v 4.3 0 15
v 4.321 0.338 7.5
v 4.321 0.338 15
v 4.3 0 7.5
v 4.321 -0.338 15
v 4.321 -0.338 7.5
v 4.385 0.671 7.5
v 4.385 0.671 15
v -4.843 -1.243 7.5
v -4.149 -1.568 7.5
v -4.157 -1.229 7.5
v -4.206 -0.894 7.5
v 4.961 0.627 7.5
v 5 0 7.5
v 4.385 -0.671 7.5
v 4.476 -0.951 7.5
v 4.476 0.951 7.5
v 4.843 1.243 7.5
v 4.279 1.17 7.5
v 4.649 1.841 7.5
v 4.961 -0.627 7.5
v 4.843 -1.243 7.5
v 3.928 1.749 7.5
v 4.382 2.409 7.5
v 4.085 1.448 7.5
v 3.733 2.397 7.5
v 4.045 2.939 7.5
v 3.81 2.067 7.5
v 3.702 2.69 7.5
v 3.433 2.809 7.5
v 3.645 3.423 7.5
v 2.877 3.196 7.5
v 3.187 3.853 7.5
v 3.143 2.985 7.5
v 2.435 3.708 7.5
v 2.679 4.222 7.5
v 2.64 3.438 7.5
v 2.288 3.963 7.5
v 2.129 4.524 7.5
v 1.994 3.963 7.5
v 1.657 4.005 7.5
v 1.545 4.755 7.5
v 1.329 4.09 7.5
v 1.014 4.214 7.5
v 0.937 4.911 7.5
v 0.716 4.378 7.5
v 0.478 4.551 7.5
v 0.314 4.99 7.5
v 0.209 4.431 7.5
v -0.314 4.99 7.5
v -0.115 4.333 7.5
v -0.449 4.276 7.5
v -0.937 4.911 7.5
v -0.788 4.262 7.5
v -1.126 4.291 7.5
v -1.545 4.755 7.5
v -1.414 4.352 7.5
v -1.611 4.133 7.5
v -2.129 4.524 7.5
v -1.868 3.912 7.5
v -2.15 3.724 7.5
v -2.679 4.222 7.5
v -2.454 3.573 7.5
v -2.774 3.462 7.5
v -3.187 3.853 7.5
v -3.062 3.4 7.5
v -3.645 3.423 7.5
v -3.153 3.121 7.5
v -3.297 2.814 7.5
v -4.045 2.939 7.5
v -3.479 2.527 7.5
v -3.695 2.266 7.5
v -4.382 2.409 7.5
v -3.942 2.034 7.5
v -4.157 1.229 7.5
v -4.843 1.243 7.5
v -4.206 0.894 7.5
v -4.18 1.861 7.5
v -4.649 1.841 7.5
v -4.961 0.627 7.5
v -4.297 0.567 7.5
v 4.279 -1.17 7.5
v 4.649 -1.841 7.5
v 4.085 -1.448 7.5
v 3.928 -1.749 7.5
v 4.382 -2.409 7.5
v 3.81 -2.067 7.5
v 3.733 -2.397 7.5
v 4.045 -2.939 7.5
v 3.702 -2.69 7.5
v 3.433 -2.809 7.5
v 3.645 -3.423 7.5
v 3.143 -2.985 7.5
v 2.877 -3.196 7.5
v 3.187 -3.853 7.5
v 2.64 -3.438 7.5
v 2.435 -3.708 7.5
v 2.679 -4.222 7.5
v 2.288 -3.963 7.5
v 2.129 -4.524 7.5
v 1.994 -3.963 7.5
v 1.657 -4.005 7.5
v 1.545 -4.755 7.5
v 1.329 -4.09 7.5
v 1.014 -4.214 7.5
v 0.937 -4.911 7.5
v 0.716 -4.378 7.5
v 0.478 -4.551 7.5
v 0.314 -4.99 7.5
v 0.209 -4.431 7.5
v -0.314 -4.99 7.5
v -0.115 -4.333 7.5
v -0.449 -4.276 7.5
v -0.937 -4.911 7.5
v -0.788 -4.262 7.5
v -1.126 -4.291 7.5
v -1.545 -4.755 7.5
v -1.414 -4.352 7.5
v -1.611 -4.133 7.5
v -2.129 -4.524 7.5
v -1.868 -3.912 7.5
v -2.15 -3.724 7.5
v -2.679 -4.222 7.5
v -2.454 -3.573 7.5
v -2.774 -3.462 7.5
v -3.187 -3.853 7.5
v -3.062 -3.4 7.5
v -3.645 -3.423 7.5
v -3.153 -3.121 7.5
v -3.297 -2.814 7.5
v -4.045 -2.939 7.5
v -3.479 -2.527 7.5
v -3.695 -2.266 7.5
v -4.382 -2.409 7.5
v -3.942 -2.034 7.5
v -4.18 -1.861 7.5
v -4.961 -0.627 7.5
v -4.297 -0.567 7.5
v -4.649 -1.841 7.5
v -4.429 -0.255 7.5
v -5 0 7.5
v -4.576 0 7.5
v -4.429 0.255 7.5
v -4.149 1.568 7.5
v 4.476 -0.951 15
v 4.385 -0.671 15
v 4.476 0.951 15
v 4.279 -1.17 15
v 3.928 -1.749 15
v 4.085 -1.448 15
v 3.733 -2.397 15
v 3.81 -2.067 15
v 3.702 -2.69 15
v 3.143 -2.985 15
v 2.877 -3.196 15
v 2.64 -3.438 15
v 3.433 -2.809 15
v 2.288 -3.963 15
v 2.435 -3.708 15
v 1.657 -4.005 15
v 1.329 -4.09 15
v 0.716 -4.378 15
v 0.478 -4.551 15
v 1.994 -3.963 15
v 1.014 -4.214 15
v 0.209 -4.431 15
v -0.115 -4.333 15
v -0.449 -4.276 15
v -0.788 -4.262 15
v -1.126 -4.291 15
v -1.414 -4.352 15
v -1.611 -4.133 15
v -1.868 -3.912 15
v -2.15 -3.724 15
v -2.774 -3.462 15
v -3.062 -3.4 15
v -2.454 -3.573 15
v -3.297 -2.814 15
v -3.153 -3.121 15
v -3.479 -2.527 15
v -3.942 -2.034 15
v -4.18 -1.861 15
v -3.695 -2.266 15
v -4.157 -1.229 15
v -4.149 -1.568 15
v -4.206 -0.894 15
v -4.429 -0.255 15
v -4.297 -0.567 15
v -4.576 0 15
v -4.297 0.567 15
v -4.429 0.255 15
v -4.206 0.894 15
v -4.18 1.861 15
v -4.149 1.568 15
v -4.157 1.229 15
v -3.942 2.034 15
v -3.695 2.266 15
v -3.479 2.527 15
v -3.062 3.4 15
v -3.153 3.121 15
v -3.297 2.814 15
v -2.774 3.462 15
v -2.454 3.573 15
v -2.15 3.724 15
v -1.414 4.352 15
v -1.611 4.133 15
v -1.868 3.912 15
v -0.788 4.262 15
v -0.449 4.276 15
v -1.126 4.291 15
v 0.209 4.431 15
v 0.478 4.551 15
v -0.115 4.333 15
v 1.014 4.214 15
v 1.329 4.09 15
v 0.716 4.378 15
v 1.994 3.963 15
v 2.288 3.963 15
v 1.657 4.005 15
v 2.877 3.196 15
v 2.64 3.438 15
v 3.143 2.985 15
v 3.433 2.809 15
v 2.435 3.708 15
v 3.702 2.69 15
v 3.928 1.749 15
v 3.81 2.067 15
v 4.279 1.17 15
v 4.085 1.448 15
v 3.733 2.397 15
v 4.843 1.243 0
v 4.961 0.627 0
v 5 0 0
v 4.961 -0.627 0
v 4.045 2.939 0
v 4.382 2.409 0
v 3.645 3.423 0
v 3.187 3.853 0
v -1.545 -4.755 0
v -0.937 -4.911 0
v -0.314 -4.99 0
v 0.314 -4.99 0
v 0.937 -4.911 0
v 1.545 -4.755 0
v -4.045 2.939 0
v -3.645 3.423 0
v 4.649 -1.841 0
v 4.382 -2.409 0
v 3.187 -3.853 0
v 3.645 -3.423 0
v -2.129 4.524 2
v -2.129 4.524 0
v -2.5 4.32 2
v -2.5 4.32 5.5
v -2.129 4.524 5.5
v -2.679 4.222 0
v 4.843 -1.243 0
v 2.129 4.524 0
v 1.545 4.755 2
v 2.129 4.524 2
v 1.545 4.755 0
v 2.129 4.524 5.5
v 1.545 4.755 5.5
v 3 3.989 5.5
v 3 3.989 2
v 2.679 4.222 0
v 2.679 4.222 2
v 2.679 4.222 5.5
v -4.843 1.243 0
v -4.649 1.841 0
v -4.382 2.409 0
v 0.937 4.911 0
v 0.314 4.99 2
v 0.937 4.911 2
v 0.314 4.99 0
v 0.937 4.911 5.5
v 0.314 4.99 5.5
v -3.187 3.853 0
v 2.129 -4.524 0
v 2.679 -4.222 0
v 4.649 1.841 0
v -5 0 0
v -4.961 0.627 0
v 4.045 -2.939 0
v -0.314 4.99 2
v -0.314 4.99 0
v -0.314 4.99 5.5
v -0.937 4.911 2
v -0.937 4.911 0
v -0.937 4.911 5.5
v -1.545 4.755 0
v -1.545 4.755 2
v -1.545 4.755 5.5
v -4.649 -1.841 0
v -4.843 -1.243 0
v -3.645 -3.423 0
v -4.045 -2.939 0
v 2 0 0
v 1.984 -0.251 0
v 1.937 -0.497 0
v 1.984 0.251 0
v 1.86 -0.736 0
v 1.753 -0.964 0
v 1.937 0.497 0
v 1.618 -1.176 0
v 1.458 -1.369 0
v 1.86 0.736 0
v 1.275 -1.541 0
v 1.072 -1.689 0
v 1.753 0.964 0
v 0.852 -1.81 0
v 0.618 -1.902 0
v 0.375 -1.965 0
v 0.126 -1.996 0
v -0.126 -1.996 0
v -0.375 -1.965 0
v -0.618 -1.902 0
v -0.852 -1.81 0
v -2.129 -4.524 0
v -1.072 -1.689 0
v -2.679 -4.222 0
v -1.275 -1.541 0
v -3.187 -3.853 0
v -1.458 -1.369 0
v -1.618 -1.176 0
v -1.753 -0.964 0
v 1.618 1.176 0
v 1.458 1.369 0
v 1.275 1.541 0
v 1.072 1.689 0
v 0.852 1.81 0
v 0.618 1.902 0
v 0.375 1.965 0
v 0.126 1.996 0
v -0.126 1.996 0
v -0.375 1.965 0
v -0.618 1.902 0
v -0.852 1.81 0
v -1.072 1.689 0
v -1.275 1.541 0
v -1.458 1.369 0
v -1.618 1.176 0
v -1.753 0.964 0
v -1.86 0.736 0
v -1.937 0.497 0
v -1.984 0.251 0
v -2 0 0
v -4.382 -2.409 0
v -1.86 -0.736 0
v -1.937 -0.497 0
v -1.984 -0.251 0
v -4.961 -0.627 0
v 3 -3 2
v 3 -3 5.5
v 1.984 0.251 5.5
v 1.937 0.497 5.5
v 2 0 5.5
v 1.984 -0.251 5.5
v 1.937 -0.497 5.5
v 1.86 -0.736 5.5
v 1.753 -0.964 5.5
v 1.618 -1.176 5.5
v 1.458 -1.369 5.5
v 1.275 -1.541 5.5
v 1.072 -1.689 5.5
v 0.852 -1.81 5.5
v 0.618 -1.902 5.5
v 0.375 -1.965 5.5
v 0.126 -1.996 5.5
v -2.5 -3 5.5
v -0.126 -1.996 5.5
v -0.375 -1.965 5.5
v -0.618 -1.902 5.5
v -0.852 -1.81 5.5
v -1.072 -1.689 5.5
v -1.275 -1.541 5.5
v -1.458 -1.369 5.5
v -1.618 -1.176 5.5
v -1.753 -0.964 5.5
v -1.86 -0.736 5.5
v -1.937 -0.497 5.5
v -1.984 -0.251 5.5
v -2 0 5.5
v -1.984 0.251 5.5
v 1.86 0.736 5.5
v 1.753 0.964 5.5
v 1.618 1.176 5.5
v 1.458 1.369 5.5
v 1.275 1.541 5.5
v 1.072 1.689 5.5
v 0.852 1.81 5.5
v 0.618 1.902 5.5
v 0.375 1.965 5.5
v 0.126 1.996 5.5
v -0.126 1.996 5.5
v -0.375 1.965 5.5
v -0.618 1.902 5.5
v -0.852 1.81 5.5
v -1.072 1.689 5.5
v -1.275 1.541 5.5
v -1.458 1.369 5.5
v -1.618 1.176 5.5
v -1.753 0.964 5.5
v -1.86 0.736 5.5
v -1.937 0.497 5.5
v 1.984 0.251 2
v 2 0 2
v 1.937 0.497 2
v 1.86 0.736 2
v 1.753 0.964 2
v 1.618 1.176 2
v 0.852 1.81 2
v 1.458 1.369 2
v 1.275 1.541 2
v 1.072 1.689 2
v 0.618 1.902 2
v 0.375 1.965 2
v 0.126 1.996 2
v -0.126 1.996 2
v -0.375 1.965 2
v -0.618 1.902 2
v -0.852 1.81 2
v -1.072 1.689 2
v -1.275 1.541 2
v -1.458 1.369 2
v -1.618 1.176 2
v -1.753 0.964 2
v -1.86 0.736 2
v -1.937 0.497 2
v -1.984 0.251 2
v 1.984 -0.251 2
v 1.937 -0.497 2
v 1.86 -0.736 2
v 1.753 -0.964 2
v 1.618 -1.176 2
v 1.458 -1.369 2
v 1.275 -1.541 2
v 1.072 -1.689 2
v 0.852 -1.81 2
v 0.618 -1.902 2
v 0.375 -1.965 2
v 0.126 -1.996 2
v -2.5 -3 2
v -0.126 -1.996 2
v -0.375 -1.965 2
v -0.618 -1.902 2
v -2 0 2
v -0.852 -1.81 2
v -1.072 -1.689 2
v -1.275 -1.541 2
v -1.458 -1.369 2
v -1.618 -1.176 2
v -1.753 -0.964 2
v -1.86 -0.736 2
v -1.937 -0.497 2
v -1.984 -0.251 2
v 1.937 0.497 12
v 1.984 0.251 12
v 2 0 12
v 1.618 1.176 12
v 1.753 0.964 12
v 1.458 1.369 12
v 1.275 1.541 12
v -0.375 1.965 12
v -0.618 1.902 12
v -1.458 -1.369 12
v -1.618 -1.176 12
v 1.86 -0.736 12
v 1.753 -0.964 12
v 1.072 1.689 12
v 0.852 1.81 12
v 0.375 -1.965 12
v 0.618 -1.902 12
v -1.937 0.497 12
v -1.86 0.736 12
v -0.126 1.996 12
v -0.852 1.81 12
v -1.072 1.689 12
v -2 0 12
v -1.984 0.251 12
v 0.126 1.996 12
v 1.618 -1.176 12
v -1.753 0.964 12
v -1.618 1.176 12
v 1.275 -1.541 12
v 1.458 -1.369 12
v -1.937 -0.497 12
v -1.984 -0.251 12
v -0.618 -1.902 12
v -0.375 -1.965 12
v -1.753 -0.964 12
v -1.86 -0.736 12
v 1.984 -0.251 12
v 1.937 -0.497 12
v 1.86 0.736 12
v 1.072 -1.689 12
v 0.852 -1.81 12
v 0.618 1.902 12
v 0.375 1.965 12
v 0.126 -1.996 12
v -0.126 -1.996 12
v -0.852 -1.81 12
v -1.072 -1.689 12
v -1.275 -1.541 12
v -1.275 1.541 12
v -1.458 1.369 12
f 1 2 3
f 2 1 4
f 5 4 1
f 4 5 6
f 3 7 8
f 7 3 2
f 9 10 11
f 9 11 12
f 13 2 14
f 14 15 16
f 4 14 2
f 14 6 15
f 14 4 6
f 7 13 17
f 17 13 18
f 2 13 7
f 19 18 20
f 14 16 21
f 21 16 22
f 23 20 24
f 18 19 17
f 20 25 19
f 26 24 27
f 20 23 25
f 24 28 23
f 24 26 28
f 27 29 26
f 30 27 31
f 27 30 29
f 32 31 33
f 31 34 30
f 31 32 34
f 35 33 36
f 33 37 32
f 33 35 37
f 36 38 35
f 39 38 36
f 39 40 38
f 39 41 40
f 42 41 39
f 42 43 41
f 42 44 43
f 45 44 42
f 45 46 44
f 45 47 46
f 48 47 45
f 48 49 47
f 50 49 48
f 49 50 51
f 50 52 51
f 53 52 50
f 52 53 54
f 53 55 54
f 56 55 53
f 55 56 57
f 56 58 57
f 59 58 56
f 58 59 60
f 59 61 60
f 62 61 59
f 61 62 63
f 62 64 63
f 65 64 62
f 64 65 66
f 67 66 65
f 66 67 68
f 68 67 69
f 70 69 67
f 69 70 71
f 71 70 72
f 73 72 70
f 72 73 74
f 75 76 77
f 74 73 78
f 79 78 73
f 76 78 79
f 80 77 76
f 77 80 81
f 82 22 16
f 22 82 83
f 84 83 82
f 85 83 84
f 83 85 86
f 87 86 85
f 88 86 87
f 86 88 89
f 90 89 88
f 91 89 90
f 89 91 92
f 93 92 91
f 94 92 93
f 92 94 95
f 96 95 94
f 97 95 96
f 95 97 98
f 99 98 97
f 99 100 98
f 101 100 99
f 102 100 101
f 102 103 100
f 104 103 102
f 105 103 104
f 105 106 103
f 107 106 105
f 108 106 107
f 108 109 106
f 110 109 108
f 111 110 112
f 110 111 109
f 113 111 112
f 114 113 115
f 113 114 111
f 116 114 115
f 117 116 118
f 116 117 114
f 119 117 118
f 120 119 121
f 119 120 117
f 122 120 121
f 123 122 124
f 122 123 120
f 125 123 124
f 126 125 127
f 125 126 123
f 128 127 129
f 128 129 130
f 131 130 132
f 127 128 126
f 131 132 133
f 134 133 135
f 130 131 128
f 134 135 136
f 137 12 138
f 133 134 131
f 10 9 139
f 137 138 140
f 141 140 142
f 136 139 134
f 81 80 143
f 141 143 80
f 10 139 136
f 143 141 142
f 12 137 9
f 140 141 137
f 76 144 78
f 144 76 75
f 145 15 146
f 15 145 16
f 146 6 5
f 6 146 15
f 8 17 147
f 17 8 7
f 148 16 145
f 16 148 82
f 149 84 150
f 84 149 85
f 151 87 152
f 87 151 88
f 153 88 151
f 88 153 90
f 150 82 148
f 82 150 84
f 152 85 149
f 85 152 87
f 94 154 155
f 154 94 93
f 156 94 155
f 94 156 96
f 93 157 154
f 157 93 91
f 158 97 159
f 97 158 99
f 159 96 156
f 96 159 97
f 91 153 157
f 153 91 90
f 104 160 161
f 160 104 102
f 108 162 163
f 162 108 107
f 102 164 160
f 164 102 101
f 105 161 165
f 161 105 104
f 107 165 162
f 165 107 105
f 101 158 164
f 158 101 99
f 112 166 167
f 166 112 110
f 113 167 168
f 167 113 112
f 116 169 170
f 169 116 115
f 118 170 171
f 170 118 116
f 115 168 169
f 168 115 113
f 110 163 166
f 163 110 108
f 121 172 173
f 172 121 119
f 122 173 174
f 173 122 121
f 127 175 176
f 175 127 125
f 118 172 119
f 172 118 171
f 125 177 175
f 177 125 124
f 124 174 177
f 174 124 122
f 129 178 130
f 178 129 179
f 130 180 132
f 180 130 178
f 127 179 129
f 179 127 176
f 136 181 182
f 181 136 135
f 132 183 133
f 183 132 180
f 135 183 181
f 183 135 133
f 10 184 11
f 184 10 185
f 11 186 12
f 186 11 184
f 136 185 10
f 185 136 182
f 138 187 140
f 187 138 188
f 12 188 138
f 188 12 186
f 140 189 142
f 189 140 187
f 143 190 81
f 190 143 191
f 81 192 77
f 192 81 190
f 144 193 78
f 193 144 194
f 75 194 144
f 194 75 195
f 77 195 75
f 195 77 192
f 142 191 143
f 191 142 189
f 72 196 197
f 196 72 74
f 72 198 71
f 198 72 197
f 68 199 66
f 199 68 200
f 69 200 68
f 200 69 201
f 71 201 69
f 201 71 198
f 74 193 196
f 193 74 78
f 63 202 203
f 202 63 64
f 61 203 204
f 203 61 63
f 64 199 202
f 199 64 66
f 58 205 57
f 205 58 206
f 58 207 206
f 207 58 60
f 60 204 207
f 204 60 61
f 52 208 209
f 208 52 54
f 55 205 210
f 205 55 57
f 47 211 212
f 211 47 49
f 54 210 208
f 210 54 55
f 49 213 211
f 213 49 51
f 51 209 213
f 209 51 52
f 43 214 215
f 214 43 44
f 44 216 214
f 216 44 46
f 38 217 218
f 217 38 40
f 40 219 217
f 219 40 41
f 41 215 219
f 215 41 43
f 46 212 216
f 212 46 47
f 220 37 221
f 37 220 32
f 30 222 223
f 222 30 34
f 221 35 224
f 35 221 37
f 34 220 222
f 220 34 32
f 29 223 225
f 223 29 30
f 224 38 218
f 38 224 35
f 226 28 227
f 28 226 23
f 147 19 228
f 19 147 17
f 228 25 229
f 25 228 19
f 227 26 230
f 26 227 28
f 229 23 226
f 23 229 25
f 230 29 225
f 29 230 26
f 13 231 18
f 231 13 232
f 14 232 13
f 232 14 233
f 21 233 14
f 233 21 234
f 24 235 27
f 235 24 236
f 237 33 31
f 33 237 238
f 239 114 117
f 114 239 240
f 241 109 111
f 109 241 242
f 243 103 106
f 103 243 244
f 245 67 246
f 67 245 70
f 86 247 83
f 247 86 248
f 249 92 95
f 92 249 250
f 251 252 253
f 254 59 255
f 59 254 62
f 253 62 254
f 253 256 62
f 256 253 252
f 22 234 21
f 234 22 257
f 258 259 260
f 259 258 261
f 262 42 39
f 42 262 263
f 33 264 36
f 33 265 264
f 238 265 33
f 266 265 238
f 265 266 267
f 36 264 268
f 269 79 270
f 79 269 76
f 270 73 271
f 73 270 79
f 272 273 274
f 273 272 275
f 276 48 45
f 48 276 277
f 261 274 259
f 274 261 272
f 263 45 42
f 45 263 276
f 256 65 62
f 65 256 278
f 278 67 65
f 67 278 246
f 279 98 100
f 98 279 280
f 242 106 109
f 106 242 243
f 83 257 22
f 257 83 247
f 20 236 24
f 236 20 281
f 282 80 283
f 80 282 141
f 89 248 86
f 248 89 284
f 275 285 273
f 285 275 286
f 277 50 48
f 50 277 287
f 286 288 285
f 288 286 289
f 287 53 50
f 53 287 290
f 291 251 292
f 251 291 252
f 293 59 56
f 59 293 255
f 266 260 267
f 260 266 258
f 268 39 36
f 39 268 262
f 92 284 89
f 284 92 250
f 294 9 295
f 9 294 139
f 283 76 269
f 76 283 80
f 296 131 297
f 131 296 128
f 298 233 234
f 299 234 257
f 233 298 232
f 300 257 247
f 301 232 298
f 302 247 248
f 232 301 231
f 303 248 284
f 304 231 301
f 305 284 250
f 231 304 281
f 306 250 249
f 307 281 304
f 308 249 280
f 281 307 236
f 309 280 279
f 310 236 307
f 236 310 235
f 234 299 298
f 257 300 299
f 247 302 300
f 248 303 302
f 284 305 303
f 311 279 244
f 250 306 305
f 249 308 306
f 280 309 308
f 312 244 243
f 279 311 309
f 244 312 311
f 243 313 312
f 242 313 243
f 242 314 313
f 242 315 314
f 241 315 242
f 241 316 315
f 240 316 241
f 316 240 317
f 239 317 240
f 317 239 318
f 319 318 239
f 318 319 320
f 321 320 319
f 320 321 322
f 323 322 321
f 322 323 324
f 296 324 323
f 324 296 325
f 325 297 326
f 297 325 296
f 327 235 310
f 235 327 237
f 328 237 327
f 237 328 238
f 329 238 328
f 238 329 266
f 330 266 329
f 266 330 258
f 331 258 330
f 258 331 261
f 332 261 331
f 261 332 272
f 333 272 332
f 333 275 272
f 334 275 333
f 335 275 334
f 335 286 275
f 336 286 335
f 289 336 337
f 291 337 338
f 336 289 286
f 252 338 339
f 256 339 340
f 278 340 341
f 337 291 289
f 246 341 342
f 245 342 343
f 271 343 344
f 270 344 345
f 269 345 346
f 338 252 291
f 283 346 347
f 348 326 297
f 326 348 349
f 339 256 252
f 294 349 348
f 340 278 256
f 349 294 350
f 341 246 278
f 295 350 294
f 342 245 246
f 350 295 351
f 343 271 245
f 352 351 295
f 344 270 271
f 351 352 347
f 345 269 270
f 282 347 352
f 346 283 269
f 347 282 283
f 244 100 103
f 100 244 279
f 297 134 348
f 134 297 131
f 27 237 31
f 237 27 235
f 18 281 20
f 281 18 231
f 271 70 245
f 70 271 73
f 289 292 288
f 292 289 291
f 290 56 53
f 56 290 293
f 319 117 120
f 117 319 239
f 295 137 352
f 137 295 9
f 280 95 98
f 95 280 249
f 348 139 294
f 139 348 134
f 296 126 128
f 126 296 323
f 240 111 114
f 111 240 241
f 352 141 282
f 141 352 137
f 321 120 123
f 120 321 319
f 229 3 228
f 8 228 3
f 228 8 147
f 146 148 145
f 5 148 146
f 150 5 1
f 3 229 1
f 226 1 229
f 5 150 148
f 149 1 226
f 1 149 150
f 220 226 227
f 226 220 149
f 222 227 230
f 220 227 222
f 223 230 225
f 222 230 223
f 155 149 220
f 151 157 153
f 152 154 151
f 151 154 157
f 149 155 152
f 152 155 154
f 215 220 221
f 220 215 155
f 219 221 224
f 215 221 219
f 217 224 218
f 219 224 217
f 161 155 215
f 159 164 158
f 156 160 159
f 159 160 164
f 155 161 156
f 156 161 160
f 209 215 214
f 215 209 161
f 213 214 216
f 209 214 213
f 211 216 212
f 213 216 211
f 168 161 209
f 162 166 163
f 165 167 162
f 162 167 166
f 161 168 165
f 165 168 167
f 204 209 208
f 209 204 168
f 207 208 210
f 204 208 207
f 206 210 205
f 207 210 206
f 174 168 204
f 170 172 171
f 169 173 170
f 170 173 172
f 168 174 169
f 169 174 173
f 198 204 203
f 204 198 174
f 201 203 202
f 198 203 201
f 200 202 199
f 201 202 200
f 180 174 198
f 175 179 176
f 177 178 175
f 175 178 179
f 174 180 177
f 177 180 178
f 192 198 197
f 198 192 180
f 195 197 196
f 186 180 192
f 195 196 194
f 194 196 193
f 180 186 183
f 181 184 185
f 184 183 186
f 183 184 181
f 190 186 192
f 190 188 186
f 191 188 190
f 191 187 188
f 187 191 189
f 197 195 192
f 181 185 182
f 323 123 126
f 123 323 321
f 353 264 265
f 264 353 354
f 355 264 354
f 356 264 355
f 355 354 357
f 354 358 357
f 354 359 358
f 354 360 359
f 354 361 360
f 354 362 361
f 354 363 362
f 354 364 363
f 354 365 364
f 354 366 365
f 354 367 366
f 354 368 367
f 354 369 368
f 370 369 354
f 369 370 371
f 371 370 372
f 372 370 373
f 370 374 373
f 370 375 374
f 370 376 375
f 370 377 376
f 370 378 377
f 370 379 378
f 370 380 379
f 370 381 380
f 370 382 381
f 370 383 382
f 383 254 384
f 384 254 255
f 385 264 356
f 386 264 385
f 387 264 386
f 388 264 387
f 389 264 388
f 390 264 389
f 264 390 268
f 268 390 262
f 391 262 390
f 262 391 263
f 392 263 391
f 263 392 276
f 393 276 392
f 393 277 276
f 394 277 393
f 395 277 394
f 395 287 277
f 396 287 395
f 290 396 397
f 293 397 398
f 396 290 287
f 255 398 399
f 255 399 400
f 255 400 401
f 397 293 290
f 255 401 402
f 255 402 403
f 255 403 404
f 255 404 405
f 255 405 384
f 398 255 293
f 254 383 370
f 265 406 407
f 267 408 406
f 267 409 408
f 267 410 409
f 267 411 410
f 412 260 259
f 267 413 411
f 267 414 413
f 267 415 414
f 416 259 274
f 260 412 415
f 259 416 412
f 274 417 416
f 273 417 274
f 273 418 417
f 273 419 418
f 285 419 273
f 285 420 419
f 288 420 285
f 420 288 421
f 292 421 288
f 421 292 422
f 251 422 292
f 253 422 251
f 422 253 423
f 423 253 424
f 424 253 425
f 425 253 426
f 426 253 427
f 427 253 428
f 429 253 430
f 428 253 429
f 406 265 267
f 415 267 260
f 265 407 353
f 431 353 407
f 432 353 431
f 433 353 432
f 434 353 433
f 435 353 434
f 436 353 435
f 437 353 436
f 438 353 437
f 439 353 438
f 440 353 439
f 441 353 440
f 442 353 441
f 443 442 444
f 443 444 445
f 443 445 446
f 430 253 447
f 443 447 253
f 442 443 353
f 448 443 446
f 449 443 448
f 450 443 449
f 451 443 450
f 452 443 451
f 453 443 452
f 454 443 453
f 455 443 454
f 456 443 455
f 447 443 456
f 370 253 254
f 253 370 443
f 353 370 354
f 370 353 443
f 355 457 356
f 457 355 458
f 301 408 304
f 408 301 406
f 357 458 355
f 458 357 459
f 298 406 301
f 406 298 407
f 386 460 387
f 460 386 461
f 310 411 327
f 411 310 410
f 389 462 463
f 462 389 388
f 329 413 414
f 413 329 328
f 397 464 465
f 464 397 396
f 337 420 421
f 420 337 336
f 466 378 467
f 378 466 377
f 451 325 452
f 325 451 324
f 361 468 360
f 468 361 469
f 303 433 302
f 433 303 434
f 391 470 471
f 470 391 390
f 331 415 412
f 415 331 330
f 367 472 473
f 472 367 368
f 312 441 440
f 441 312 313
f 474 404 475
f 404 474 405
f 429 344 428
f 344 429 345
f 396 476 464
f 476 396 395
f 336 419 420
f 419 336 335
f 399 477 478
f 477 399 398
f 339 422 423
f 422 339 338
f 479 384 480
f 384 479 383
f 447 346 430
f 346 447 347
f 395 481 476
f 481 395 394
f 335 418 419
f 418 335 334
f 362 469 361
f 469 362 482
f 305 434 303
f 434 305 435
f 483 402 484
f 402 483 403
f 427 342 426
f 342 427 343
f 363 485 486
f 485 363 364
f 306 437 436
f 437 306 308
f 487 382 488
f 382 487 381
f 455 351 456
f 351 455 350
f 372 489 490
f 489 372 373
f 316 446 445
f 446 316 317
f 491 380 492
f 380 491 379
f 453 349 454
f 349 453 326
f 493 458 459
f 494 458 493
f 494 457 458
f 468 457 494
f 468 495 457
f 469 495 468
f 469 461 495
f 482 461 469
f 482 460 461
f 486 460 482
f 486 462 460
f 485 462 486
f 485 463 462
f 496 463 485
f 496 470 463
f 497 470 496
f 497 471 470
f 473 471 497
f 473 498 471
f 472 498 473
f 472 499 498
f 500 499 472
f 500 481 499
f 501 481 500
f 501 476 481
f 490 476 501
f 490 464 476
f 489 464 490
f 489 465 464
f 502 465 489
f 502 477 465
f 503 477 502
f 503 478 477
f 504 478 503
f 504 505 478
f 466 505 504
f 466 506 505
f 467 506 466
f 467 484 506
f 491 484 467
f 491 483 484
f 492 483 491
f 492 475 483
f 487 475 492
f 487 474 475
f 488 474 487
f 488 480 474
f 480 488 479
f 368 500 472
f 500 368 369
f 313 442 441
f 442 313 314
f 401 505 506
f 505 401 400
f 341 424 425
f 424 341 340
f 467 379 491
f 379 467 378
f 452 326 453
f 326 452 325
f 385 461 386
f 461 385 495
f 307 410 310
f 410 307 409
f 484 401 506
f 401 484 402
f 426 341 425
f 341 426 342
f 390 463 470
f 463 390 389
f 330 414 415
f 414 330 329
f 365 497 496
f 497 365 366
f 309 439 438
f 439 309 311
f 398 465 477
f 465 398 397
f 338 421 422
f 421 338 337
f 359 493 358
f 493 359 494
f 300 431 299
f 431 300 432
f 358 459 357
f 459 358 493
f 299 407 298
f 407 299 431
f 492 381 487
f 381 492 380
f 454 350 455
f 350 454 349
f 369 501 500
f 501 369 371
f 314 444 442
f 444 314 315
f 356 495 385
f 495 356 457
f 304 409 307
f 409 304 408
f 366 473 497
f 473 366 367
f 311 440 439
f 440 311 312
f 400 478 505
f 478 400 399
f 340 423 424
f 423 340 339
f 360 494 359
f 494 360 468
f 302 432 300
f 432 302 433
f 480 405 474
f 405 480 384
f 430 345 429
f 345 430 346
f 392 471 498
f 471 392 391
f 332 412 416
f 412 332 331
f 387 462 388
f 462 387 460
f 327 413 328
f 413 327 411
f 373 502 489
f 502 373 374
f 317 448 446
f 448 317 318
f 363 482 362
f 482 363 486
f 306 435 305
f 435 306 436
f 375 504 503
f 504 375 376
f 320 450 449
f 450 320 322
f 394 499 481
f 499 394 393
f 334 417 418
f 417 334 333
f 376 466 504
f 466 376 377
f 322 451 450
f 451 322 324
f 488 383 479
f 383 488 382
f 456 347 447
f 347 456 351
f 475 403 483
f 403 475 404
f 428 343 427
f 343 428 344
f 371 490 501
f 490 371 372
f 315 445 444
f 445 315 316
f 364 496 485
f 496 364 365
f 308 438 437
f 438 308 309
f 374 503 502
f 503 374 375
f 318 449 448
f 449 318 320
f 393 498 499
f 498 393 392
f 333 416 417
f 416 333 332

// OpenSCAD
// file: configure.scad
/*
 * file: configure.scad
 * author: gregor binder <gregor_reprap@catrix.at>
 * date: 16.11.2013
 * last change: 16.11.2013
 * license: CC BY-NC-SA 3.0
 */

nutsize=5.5;
nutdiagonale=6;
nutheight=3.5;
nutplaceholder=2;
screwdiameter=4;
screwheaddiameter=7;
rightdiameter=10;
rightheight=15;
leftheight=15;
leftthickness=8;
leftwidth=10;
gripradius=1.7;
$fn=50;
// main file
/*
 * file: box-closer-right.scad
 * author: gregor binder <gregor_reprap@catrix.at>
 * date: 16.11.2013
 * last change: 16.11.2013
 * license: CC BY-NC-SA 3.0
 */

include <configure.scad>;

module grip() {
	count=15;
	for ( i = [0 : count-1] ) {
		rotate( i * 360 / count, [1, 0, 0])
			translate([0, 0, 7])
				rotate([0,90,0])
					cylinder(h=rightheight,r=gripradius+1);
	}
}

difference() {
	cylinder(h=rightheight,r=rightdiameter/2);
	translate([-(rightdiameter/4),-(nutdiagonale/2),nutplaceholder])
		cube([nutsize,20,nutheight]);
	translate([0,0,-3])
		cylinder(h=rightheight,r=screwdiameter/2);
	translate([0,0,rightheight+nutplaceholder+nutheight+nutplaceholder])
		rotate([0,90,0])
			grip();
}
